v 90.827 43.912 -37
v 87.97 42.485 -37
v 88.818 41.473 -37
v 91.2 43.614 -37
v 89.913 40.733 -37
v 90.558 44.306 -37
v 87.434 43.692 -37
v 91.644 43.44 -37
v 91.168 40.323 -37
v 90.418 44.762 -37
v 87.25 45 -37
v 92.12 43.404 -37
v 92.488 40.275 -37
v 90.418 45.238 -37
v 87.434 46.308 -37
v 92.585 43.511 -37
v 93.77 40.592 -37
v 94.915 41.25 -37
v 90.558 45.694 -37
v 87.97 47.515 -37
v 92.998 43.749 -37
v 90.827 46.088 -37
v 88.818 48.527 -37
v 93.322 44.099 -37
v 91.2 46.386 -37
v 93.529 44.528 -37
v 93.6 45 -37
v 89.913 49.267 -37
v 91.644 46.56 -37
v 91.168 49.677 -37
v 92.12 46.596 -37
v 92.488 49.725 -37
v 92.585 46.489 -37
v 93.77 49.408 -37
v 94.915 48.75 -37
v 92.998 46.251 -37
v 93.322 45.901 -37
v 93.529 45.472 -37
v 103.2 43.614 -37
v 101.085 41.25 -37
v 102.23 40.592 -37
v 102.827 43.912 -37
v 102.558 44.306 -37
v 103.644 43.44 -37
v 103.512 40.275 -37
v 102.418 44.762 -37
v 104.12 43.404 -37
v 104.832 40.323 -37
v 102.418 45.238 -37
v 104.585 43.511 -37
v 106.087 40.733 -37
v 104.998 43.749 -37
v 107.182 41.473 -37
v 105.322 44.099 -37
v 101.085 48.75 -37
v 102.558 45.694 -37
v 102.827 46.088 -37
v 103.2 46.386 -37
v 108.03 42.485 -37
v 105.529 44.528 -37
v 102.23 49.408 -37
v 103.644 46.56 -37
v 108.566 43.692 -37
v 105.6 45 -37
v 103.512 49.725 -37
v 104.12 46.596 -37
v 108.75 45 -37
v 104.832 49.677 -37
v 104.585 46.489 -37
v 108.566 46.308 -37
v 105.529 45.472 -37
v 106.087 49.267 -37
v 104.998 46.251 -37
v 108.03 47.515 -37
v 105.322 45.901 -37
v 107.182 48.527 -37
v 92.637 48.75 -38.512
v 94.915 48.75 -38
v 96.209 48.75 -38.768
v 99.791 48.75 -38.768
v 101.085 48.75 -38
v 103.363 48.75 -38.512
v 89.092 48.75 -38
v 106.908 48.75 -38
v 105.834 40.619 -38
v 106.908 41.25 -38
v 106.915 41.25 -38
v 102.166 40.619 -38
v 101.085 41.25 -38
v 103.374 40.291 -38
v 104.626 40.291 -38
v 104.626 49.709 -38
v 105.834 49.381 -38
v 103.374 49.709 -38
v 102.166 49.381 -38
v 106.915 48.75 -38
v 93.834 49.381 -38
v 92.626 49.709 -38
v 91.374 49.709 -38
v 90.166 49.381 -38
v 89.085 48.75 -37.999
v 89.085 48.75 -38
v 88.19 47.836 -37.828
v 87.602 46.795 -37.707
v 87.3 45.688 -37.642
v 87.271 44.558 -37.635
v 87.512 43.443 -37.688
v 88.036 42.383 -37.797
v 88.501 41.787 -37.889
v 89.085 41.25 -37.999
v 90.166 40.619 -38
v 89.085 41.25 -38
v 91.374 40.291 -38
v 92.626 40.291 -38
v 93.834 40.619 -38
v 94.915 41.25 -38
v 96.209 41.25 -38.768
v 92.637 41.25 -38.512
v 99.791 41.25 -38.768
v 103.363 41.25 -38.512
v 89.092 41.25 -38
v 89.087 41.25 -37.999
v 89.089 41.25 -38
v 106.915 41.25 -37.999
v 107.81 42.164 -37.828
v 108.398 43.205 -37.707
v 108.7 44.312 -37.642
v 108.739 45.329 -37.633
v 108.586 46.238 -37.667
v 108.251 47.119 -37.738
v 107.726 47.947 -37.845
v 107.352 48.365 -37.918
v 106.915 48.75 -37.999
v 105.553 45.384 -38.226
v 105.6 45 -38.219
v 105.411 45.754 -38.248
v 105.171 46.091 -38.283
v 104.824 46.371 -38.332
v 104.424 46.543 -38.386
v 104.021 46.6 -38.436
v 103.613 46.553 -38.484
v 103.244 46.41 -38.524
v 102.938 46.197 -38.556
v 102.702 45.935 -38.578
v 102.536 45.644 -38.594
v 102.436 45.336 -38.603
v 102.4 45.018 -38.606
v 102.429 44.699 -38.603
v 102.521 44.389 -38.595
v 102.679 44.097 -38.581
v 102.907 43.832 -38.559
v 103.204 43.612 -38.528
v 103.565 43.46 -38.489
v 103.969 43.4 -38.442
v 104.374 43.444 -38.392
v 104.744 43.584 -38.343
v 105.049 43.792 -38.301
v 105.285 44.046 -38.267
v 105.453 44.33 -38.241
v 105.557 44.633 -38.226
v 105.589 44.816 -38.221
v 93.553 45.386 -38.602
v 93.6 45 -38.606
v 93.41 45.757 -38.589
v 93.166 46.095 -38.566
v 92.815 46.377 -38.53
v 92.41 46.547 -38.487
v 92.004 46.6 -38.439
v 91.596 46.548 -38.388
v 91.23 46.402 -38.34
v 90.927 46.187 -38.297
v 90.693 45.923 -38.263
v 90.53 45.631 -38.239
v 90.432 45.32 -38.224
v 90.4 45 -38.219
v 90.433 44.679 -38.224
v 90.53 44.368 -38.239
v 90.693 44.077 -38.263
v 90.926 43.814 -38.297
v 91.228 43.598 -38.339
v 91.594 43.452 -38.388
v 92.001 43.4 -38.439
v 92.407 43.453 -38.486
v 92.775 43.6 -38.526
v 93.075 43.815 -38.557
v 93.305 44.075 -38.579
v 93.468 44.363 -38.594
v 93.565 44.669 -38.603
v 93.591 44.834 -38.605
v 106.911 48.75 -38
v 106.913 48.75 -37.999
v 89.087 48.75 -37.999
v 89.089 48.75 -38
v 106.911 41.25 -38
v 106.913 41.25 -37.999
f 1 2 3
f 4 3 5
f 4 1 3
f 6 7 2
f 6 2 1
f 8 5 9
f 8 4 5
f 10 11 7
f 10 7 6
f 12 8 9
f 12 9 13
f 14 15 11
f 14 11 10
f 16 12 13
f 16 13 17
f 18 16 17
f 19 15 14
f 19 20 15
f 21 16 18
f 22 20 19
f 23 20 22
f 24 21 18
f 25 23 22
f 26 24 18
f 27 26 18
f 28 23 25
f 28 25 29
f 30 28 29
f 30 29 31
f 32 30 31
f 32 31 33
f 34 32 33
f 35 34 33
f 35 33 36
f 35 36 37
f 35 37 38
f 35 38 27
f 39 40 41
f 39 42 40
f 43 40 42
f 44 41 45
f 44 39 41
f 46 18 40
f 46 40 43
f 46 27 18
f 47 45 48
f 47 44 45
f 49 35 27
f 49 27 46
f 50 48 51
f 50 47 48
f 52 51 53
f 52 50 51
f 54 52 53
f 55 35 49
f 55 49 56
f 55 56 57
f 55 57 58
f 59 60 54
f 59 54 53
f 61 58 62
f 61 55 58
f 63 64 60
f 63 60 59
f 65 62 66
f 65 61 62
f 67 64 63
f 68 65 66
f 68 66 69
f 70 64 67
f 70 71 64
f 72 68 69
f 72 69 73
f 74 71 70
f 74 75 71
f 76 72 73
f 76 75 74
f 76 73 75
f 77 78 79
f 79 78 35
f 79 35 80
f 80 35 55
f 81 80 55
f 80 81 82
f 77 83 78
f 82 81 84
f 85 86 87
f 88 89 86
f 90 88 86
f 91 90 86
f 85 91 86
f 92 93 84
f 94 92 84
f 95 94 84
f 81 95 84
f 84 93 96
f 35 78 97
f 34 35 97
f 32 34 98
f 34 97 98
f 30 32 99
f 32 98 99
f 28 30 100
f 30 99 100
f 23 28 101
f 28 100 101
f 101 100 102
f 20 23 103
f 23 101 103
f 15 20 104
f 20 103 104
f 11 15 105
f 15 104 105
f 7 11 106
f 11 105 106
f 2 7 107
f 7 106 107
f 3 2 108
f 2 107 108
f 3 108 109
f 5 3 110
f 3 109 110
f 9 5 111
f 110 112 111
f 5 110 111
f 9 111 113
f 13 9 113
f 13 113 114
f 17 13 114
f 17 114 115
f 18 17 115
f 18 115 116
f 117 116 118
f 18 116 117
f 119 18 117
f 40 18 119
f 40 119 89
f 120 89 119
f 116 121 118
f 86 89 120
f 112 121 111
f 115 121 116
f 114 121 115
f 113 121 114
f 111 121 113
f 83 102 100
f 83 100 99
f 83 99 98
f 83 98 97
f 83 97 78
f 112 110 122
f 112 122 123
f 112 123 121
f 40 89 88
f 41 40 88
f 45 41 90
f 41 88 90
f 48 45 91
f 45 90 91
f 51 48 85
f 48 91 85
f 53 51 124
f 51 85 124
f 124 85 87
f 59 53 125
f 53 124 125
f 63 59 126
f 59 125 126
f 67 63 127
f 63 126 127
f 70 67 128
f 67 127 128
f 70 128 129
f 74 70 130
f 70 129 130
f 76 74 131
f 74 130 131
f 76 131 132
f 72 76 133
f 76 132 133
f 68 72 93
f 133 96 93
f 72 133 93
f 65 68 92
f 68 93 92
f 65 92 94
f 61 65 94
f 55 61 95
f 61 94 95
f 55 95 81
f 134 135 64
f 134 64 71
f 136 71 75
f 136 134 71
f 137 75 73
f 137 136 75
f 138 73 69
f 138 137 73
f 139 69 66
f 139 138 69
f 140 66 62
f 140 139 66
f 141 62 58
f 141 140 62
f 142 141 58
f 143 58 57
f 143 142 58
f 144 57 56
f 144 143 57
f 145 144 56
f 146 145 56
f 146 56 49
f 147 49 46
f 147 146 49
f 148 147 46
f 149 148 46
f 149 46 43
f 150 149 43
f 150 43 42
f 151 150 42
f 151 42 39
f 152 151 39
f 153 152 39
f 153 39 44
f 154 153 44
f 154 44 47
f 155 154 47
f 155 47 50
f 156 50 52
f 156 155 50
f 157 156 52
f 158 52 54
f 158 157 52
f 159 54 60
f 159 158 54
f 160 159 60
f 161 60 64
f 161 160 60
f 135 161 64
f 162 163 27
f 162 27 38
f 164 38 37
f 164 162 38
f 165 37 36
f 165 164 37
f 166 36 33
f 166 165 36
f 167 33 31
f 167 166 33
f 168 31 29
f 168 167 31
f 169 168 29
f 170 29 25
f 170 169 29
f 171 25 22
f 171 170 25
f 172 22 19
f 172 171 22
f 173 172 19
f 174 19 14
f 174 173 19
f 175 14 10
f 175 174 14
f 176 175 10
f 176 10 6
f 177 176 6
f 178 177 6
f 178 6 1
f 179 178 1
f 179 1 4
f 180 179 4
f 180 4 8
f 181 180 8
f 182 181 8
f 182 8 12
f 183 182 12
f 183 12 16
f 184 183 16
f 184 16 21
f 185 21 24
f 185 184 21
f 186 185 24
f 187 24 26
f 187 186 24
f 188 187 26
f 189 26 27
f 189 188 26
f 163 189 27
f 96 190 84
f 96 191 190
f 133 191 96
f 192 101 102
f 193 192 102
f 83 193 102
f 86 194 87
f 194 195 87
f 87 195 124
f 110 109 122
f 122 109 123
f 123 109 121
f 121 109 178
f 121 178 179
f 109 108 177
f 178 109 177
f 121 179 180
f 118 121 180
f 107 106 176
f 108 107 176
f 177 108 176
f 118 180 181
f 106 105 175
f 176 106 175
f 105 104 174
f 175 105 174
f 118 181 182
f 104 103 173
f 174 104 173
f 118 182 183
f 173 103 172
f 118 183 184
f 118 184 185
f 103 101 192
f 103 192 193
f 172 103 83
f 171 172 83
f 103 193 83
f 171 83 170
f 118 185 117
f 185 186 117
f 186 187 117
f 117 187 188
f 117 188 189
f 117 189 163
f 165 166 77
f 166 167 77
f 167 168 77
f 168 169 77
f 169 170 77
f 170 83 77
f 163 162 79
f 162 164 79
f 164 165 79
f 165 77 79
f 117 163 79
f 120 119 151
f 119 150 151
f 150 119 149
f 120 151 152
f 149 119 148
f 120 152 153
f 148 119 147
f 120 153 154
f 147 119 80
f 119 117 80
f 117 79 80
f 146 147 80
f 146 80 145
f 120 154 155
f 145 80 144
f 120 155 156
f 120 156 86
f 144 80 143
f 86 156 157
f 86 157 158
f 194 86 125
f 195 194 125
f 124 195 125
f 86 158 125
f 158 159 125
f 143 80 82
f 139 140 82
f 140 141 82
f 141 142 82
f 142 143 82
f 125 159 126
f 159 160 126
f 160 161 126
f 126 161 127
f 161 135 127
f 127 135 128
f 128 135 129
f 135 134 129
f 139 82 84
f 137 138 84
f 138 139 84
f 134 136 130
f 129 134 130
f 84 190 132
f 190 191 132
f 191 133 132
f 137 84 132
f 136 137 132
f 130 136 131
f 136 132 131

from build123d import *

# Parameters (mm, degrees)
CYLINDER022_R          = 1.6
CYLINDER022_DEPTH      = 10
CYLINDER021_R          = 1.6
CYLINDER021_DEPTH      = 10
CYLINDER020_R          = 50
CYLINDER020_DEPTH      = 7.5
CYLINDER020_ROLL_ANGLE = 90
CYLINDER019_R          = 51
CYLINDER019_DEPTH      = 7.5
CYLINDER019_ROLL_ANGLE = 90
BOX022_W               = 317
BOX022_H               = 10
BOX022_DEPTH           = 300
CYLINDER018_R          = 50
CYLINDER018_DEPTH      = 7.5
CYLINDER018_ROLL_ANGLE = 90
CYLINDER017_R          = 4.75
CYLINDER017_DEPTH      = 1
CYLINDER016_R          = 4.75
CYLINDER016_DEPTH      = 1
BOX021_W               = 12
BOX021_H               = 7.5
BOX021_DEPTH           = 1


with BuildPart() as cylinder022:
    # Cylinder022 → Cylinder022 (new body)
    with BuildSketch(Plane(origin=(0, -18, -9.2), x_dir=(1, 0, 0), z_dir=(0, 0, 1))):
        Circle(CYLINDER022_R)
    extrude(amount=CYLINDER022_DEPTH)


with BuildPart() as fusion015:
    # Cylinder021 → Cylinder021 (new body)
    with BuildSketch(Plane(origin=(12, -18, -9.2), x_dir=(1, 0, 0), z_dir=(0, 0, 1))):
        Circle(CYLINDER021_R)
    extrude(amount=CYLINDER021_DEPTH)

    # Fusion015: union Cylinder022
    add(cylinder022.part)


with BuildPart() as fusion015_1:
    # Fusion015 placement: moved
    add(fusion015.part.moved(Location((0, 0, 5))))


with BuildPart() as cylinder020:
    # Cylinder020 → Cylinder020 (new body)
    with BuildSketch(Plane.XY):
        Circle(CYLINDER020_R)
    extrude(amount=CYLINDER020_DEPTH)


with BuildPart() as cylinder020_1:
    # Cylinder020 roll: moved
    add(cylinder020.part.rotate(Axis((0, 0, 0), (1, 0, 0)), CYLINDER020_ROLL_ANGLE))


with BuildPart() as cylinder020_2:
    # Cylinder020 placement: moved
    add(cylinder020_1.part.moved(Location((6, -14.25, 49.2))))


with BuildPart() as cut019:
    # Cylinder019 → Cylinder019 (new body)
    with BuildSketch(Plane.XY):
        Circle(CYLINDER019_R)
    extrude(amount=CYLINDER019_DEPTH)


with BuildPart() as cut019_1:
    # Cylinder019 roll: moved
    add(cut019.part.rotate(Axis((0, 0, 0), (1, 0, 0)), CYLINDER019_ROLL_ANGLE))


with BuildPart() as cut019_2:
    # Cylinder019 placement: moved
    add(cut019_1.part.moved(Location((6, -14.25, 49.2))))

    # Cut019: cut Cylinder020
    add(cylinder020_2.part, mode=Mode.SUBTRACT)


with BuildPart() as box022:
    # Box022 → Box022 (new body)
    with BuildSketch(Plane(origin=(-150, -22, 0), x_dir=(1, 0, 0), z_dir=(0, 0, 1))):
        with Locations((158.5, 5)):
            Rectangle(BOX022_W, BOX022_H)
    extrude(amount=BOX022_DEPTH)


with BuildPart() as cut018:
    # Cylinder018 → Cylinder018 (new body)
    with BuildSketch(Plane.XY):
        Circle(CYLINDER018_R)
    extrude(amount=CYLINDER018_DEPTH)


with BuildPart() as cut018_1:
    # Cylinder018 roll: moved
    add(cut018.part.rotate(Axis((0, 0, 0), (1, 0, 0)), CYLINDER018_ROLL_ANGLE))


with BuildPart() as cut018_2:
    # Cylinder018 placement: moved
    add(cut018_1.part.moved(Location((6, -14.25, 49.2))))

    # Cut018: cut Box022
    add(box022.part, mode=Mode.SUBTRACT)


with BuildPart() as cylinder017:
    # Cylinder017 → Cylinder017 (new body)
    with BuildSketch(Plane(origin=(0, -18, 0), x_dir=(1, 0, 0), z_dir=(0, 0, 1))):
        Circle(CYLINDER017_R)
    extrude(amount=CYLINDER017_DEPTH)


with BuildPart() as cylinder016:
    # Cylinder016 → Cylinder016 (new body)
    with BuildSketch(Plane(origin=(12, -18, 0), x_dir=(1, 0, 0), z_dir=(0, 0, 1))):
        Circle(CYLINDER016_R)
    extrude(amount=CYLINDER016_DEPTH)


with BuildPart() as leafspring_spacer_upper_front_left:
    # Box021 → Box021 (new body)
    with BuildSketch(Plane(origin=(0, -21.75, 0), x_dir=(1, 0, 0), z_dir=(0, 0, 1))):
        with Locations((6, 3.75)):
            Rectangle(BOX021_W, BOX021_H)
    extrude(amount=BOX021_DEPTH)

    # Fusion014: union Cut018, Cylinder017, Cylinder016
    add(cut018_2.part)
    add(cylinder017.part)
    add(cylinder016.part)

    # Cut020: cut Cut019
    add(cut019_2.part, mode=Mode.SUBTRACT)

    # Cut021: cut Fusion015
    add(fusion015_1.part, mode=Mode.SUBTRACT)


with BuildPart() as leafspring_spacer_upper_front_left_1:
    # Cut021 placement: moved
    add(leafspring_spacer_upper_front_left.part.moved(Location((92, 63, -38))))


solid = leafspring_spacer_upper_front_left_1.part
